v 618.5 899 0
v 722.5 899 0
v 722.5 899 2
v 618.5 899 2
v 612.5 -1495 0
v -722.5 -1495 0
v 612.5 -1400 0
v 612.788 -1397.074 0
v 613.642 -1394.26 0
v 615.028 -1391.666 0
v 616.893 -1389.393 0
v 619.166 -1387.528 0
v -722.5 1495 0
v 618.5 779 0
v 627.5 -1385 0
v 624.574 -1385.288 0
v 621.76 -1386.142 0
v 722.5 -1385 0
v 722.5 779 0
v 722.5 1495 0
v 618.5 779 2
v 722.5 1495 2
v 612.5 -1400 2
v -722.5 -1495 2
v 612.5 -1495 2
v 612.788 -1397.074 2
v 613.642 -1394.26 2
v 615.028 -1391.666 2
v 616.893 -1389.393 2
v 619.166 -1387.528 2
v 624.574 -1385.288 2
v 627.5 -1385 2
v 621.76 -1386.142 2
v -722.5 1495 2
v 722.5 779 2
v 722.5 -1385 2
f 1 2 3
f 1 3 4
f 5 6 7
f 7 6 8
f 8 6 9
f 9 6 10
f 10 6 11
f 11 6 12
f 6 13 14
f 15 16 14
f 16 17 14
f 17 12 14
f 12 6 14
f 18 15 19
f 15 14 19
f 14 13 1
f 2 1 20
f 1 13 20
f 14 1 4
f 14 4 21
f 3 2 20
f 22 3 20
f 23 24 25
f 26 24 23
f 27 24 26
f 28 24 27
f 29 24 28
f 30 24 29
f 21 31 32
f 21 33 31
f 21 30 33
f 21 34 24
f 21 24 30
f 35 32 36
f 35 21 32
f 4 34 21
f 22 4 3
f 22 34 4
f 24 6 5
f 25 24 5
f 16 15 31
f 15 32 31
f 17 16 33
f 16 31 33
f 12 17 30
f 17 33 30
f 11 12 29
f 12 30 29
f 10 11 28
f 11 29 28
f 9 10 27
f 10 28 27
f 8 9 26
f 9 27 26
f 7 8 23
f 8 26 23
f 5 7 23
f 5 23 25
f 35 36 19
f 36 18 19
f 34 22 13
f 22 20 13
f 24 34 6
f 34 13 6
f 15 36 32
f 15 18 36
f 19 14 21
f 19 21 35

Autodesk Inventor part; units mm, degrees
ref_plane "YZ Plane" through (0, 0, 0) normal (1, 0, 0) x (0, 1, 0)
ref_plane "XZ Plane" through (0, 0, 0) normal (0, 1, 0) x (-1, 0, 0)
ref_plane "XY Plane" through (0, 0, 0) normal (0, 0, 1) x (1, 0, 0)
sketch "Sketch1" plane through (0, 0, 0) normal (0, 0, 1) x (1, 0, 0)
  line L0 (-722.5, -1495) -> (722.5, -1495)
  line L1 (722.5, -1495) -> (722.5, 1495)
  line L2 (722.5, 1495) -> (-722.5, 1495)
  line L3 (-722.5, 1495) -> (-722.5, -1495)
  line L4 (-722.5, -1495) -> (722.5, 1495) construction
  line L5 (722.5, -1495) -> (-722.5, 1495) construction
  line L6 (722.5, -1385) -> (612.5, -1385)
  line L7 (612.5, -1385) -> (612.5, -1495)
  line L8 (722.5, 899) -> (618.5, 899)
  line L9 (618.5, 899) -> (618.5, 779)
  line L10 (618.5, 779) -> (722.5, 779)
  line L11 (722.5, 779) -> (722.5, 899)
  point P0 (0, 0)
  point P1 (722.5, 779)
  dimension "d154" = 1445
  dimension "d155" = 2990
  dimension "d157" = 110
  dimension "d159" = 120
  dimension "d160" = 596
  dimension "d161" = 104
extrude "Plate5" add sketch "Sketch1" along normal blind 2 contours L3 L2 L1 L8 L9 L10 L6 L7 L0
fillet "Corner Round1" radius 15 1 edges at (612.5, -1385, 1)
properties part number "PNS-0111 floor sheet 2" material "Stainless Steel"
